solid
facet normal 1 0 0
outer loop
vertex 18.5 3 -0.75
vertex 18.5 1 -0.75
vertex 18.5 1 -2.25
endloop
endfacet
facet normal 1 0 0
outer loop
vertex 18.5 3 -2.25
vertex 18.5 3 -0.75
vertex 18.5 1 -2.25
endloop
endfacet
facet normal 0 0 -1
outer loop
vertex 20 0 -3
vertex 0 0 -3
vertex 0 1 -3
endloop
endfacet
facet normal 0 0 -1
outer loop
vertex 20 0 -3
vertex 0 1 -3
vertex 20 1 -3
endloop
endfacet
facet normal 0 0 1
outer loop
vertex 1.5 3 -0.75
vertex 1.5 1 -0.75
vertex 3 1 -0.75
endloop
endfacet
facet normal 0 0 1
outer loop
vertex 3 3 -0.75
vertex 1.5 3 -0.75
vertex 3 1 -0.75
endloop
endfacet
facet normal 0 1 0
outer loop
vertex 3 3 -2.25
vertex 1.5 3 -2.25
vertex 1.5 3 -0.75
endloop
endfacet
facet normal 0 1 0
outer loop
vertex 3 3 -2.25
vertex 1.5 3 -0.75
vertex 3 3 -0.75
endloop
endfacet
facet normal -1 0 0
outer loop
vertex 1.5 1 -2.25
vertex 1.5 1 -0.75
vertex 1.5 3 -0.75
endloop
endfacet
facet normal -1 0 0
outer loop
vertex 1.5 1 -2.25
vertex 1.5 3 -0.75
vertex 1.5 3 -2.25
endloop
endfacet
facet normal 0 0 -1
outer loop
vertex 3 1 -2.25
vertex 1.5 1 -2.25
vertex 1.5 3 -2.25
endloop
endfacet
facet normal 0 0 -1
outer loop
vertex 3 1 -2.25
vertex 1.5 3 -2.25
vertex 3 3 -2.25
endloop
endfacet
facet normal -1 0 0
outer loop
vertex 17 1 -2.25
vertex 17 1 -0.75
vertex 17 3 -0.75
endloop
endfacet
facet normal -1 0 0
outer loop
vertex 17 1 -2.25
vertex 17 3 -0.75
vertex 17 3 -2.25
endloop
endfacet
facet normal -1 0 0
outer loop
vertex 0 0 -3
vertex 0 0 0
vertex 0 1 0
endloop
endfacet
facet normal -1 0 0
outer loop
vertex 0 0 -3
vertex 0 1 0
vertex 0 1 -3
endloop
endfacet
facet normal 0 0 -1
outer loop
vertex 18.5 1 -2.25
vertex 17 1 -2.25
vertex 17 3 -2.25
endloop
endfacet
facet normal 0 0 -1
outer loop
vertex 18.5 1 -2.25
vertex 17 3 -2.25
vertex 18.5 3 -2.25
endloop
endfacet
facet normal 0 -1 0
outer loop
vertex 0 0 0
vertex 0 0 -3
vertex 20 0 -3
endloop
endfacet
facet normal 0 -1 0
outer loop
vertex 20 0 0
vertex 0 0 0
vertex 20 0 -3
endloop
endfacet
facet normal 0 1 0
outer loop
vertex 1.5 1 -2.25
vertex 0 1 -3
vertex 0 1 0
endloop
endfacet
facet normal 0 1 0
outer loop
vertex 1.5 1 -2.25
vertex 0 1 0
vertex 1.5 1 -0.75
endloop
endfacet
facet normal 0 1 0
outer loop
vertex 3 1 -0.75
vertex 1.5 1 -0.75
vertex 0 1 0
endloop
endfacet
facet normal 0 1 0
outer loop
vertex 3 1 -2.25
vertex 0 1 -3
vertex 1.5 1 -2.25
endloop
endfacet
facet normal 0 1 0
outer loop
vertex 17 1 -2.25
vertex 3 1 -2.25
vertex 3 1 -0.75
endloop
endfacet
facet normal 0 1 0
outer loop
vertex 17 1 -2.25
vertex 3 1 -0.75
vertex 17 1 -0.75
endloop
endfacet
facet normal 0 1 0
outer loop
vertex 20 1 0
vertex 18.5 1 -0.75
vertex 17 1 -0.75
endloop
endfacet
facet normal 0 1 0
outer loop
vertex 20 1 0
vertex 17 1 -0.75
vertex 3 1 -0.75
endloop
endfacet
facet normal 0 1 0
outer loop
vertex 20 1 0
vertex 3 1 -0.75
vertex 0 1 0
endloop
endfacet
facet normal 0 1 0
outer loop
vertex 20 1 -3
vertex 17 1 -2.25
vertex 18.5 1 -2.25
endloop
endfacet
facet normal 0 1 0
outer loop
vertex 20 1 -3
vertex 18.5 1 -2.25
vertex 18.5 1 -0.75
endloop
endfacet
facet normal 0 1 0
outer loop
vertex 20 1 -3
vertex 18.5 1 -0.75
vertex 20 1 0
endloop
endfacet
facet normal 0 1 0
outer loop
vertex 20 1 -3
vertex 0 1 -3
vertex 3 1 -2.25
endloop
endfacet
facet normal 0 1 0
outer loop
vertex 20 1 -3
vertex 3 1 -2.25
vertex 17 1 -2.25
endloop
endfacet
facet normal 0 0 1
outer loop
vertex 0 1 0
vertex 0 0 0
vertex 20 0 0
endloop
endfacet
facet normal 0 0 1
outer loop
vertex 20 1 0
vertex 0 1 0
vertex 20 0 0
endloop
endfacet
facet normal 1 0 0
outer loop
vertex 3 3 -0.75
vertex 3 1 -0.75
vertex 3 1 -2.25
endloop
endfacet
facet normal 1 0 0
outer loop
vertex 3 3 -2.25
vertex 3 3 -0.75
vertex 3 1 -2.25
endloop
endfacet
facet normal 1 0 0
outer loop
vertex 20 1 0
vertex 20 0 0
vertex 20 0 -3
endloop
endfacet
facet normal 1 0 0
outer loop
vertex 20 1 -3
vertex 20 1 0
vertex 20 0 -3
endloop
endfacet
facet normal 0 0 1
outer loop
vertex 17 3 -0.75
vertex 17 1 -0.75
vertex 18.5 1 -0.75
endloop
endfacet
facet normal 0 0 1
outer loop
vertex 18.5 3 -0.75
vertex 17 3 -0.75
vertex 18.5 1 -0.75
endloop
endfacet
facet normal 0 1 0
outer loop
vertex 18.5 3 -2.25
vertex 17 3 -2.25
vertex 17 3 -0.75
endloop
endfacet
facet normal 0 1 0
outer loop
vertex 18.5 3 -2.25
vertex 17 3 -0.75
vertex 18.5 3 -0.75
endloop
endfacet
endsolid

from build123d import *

# Parameters (mm, degrees)
SKETCH1_W           = 20
SKETCH1_H           = 3
SKETCH1_W_2         = 1.5
SKETCH1_H_2         = 1.5
BOSS_EXTRUDE1_DEPTH = 1
SKETCH1_3_W         = 1.5
SKETCH1_3_H         = 1.5
BOSS_EXTRUDE2_DEPTH = 3


with BuildPart() as part:
    # Sketch1 → Boss-Extrude1 (new body)
    with BuildSketch(Plane(origin=(0, 0, 0), x_dir=(1, 0, 0), z_dir=(0, 1, 0))):
        with Locations((10, 1.5)):
            Rectangle(SKETCH1_W, SKETCH1_H)
        with Locations((2.25, 1.5)):
            Rectangle(SKETCH1_W_2, SKETCH1_H_2, mode=Mode.SUBTRACT)
        with Locations((17.75, 1.5)):
            Rectangle(SKETCH1_W_2, SKETCH1_H_2, mode=Mode.SUBTRACT)
    extrude(amount=BOSS_EXTRUDE1_DEPTH)

    # Sketch1<3> → Boss-Extrude2 (add)
    with BuildSketch(Plane(origin=(0, 0, 0), x_dir=(1, 0, 0), z_dir=(0, 1, 0))):
        with Locations((2.25, 1.5)):
            Rectangle(SKETCH1_3_W, SKETCH1_3_H)
        with Locations((17.75, 1.5)):
            Rectangle(SKETCH1_3_W, SKETCH1_3_H)
    extrude(amount=BOSS_EXTRUDE2_DEPTH)


solid = part.part
